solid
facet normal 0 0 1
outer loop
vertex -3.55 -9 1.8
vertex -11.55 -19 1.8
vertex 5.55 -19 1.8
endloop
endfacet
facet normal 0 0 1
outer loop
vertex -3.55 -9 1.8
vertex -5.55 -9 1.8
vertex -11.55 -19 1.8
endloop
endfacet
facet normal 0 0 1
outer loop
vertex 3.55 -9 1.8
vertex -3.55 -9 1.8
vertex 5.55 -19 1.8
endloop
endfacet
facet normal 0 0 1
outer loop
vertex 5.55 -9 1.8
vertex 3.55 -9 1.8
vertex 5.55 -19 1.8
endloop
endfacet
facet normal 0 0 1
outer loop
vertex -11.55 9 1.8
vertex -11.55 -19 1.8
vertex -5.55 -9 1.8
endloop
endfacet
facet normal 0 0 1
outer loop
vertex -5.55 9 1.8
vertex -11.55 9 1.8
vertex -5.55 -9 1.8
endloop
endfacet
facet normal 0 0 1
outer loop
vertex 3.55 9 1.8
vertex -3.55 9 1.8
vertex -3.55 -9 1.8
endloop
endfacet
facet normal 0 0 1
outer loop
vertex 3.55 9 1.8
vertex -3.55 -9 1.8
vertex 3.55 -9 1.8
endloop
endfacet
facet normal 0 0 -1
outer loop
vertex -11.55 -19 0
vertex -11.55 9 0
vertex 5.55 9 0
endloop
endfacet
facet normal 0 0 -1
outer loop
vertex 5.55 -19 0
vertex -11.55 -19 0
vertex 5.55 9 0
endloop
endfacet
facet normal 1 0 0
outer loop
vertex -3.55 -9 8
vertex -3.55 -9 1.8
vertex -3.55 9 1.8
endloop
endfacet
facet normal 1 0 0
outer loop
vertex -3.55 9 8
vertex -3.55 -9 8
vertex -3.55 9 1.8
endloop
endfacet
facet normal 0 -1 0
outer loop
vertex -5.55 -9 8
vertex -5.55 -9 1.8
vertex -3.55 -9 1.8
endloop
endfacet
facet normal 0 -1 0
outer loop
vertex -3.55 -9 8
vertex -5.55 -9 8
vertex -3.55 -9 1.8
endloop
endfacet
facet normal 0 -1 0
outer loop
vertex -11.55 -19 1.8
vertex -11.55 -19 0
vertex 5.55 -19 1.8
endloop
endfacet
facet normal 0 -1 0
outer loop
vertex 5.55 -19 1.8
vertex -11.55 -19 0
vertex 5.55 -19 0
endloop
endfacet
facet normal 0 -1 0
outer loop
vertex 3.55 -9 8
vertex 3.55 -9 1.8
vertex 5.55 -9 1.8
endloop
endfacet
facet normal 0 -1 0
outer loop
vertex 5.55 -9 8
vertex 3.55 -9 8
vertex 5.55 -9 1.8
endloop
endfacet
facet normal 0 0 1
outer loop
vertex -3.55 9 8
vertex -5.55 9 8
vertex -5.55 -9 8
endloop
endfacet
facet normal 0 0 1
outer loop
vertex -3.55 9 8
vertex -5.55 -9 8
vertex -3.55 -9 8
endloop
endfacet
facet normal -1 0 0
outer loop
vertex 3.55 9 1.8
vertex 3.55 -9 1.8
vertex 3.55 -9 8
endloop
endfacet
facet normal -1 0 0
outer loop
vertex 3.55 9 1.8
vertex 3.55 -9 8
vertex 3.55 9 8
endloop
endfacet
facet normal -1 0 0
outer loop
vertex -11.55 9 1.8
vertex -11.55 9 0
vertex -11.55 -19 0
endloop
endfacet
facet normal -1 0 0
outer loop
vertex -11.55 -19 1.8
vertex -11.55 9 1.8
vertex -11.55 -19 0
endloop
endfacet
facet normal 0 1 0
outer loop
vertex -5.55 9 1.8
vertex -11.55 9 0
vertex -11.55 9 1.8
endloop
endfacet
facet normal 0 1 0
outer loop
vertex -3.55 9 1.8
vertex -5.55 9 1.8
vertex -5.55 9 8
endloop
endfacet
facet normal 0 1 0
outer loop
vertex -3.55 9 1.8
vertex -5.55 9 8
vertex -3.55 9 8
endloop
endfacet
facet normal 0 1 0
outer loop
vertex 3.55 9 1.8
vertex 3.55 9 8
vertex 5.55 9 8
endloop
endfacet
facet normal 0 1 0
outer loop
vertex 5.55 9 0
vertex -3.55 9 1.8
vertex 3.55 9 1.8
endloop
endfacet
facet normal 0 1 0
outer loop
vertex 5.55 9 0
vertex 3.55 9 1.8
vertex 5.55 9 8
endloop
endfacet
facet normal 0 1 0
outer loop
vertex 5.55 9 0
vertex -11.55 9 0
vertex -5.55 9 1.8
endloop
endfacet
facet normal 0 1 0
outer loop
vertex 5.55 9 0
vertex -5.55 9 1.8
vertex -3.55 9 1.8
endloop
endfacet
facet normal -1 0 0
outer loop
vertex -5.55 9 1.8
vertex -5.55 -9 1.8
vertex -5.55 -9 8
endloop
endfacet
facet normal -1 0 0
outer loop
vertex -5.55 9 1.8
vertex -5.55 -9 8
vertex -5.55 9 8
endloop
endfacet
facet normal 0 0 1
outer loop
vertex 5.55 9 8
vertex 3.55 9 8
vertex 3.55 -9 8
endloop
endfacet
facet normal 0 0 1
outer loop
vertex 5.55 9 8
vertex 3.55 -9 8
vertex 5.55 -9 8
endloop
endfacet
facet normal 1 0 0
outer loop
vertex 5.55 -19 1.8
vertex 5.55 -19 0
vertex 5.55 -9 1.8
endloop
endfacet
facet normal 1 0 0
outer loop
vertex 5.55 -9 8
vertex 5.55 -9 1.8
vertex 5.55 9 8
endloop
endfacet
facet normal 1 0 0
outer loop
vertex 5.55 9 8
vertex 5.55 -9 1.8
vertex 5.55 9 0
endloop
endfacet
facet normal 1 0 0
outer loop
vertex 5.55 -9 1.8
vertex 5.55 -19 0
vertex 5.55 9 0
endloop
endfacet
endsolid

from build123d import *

# Parameters (mm, degrees)
F0_W     = 7.1
F0_H     = 18
F1_DEPTH = 1.8
F0_W_2   = 2
F2_DEPTH = 8


# Not quite as in the source:
# - a feature names something its author has since deleted; it is built from what else it names


with BuildPart() as f1:
    # F0 (on Top) → F1 (new body)
    with BuildSketch(Plane.XY):
        Polygon((5.55, -9), (3.55, -9), (-3.55, -9), (-5.55, -9), (-5.55, -19), (5.55, -19), align=None)
        Rectangle(F0_W, F0_H)
        Polygon((-5.55, -19), (-5.55, -9), (-5.55, 9), (-11.55, 9), (-11.55, -19), align=None)
    extrude(amount=F1_DEPTH)

    # F0 (on Top) → F2 (join)
    with BuildSketch(Plane.XY):
        with Locations((-4.55, 0)):
            Rectangle(F0_W_2, F0_H)
        with Locations((4.55, 0)):
            Rectangle(F0_W_2, F0_H)
    extrude(amount=F2_DEPTH)


solid = f1.part
